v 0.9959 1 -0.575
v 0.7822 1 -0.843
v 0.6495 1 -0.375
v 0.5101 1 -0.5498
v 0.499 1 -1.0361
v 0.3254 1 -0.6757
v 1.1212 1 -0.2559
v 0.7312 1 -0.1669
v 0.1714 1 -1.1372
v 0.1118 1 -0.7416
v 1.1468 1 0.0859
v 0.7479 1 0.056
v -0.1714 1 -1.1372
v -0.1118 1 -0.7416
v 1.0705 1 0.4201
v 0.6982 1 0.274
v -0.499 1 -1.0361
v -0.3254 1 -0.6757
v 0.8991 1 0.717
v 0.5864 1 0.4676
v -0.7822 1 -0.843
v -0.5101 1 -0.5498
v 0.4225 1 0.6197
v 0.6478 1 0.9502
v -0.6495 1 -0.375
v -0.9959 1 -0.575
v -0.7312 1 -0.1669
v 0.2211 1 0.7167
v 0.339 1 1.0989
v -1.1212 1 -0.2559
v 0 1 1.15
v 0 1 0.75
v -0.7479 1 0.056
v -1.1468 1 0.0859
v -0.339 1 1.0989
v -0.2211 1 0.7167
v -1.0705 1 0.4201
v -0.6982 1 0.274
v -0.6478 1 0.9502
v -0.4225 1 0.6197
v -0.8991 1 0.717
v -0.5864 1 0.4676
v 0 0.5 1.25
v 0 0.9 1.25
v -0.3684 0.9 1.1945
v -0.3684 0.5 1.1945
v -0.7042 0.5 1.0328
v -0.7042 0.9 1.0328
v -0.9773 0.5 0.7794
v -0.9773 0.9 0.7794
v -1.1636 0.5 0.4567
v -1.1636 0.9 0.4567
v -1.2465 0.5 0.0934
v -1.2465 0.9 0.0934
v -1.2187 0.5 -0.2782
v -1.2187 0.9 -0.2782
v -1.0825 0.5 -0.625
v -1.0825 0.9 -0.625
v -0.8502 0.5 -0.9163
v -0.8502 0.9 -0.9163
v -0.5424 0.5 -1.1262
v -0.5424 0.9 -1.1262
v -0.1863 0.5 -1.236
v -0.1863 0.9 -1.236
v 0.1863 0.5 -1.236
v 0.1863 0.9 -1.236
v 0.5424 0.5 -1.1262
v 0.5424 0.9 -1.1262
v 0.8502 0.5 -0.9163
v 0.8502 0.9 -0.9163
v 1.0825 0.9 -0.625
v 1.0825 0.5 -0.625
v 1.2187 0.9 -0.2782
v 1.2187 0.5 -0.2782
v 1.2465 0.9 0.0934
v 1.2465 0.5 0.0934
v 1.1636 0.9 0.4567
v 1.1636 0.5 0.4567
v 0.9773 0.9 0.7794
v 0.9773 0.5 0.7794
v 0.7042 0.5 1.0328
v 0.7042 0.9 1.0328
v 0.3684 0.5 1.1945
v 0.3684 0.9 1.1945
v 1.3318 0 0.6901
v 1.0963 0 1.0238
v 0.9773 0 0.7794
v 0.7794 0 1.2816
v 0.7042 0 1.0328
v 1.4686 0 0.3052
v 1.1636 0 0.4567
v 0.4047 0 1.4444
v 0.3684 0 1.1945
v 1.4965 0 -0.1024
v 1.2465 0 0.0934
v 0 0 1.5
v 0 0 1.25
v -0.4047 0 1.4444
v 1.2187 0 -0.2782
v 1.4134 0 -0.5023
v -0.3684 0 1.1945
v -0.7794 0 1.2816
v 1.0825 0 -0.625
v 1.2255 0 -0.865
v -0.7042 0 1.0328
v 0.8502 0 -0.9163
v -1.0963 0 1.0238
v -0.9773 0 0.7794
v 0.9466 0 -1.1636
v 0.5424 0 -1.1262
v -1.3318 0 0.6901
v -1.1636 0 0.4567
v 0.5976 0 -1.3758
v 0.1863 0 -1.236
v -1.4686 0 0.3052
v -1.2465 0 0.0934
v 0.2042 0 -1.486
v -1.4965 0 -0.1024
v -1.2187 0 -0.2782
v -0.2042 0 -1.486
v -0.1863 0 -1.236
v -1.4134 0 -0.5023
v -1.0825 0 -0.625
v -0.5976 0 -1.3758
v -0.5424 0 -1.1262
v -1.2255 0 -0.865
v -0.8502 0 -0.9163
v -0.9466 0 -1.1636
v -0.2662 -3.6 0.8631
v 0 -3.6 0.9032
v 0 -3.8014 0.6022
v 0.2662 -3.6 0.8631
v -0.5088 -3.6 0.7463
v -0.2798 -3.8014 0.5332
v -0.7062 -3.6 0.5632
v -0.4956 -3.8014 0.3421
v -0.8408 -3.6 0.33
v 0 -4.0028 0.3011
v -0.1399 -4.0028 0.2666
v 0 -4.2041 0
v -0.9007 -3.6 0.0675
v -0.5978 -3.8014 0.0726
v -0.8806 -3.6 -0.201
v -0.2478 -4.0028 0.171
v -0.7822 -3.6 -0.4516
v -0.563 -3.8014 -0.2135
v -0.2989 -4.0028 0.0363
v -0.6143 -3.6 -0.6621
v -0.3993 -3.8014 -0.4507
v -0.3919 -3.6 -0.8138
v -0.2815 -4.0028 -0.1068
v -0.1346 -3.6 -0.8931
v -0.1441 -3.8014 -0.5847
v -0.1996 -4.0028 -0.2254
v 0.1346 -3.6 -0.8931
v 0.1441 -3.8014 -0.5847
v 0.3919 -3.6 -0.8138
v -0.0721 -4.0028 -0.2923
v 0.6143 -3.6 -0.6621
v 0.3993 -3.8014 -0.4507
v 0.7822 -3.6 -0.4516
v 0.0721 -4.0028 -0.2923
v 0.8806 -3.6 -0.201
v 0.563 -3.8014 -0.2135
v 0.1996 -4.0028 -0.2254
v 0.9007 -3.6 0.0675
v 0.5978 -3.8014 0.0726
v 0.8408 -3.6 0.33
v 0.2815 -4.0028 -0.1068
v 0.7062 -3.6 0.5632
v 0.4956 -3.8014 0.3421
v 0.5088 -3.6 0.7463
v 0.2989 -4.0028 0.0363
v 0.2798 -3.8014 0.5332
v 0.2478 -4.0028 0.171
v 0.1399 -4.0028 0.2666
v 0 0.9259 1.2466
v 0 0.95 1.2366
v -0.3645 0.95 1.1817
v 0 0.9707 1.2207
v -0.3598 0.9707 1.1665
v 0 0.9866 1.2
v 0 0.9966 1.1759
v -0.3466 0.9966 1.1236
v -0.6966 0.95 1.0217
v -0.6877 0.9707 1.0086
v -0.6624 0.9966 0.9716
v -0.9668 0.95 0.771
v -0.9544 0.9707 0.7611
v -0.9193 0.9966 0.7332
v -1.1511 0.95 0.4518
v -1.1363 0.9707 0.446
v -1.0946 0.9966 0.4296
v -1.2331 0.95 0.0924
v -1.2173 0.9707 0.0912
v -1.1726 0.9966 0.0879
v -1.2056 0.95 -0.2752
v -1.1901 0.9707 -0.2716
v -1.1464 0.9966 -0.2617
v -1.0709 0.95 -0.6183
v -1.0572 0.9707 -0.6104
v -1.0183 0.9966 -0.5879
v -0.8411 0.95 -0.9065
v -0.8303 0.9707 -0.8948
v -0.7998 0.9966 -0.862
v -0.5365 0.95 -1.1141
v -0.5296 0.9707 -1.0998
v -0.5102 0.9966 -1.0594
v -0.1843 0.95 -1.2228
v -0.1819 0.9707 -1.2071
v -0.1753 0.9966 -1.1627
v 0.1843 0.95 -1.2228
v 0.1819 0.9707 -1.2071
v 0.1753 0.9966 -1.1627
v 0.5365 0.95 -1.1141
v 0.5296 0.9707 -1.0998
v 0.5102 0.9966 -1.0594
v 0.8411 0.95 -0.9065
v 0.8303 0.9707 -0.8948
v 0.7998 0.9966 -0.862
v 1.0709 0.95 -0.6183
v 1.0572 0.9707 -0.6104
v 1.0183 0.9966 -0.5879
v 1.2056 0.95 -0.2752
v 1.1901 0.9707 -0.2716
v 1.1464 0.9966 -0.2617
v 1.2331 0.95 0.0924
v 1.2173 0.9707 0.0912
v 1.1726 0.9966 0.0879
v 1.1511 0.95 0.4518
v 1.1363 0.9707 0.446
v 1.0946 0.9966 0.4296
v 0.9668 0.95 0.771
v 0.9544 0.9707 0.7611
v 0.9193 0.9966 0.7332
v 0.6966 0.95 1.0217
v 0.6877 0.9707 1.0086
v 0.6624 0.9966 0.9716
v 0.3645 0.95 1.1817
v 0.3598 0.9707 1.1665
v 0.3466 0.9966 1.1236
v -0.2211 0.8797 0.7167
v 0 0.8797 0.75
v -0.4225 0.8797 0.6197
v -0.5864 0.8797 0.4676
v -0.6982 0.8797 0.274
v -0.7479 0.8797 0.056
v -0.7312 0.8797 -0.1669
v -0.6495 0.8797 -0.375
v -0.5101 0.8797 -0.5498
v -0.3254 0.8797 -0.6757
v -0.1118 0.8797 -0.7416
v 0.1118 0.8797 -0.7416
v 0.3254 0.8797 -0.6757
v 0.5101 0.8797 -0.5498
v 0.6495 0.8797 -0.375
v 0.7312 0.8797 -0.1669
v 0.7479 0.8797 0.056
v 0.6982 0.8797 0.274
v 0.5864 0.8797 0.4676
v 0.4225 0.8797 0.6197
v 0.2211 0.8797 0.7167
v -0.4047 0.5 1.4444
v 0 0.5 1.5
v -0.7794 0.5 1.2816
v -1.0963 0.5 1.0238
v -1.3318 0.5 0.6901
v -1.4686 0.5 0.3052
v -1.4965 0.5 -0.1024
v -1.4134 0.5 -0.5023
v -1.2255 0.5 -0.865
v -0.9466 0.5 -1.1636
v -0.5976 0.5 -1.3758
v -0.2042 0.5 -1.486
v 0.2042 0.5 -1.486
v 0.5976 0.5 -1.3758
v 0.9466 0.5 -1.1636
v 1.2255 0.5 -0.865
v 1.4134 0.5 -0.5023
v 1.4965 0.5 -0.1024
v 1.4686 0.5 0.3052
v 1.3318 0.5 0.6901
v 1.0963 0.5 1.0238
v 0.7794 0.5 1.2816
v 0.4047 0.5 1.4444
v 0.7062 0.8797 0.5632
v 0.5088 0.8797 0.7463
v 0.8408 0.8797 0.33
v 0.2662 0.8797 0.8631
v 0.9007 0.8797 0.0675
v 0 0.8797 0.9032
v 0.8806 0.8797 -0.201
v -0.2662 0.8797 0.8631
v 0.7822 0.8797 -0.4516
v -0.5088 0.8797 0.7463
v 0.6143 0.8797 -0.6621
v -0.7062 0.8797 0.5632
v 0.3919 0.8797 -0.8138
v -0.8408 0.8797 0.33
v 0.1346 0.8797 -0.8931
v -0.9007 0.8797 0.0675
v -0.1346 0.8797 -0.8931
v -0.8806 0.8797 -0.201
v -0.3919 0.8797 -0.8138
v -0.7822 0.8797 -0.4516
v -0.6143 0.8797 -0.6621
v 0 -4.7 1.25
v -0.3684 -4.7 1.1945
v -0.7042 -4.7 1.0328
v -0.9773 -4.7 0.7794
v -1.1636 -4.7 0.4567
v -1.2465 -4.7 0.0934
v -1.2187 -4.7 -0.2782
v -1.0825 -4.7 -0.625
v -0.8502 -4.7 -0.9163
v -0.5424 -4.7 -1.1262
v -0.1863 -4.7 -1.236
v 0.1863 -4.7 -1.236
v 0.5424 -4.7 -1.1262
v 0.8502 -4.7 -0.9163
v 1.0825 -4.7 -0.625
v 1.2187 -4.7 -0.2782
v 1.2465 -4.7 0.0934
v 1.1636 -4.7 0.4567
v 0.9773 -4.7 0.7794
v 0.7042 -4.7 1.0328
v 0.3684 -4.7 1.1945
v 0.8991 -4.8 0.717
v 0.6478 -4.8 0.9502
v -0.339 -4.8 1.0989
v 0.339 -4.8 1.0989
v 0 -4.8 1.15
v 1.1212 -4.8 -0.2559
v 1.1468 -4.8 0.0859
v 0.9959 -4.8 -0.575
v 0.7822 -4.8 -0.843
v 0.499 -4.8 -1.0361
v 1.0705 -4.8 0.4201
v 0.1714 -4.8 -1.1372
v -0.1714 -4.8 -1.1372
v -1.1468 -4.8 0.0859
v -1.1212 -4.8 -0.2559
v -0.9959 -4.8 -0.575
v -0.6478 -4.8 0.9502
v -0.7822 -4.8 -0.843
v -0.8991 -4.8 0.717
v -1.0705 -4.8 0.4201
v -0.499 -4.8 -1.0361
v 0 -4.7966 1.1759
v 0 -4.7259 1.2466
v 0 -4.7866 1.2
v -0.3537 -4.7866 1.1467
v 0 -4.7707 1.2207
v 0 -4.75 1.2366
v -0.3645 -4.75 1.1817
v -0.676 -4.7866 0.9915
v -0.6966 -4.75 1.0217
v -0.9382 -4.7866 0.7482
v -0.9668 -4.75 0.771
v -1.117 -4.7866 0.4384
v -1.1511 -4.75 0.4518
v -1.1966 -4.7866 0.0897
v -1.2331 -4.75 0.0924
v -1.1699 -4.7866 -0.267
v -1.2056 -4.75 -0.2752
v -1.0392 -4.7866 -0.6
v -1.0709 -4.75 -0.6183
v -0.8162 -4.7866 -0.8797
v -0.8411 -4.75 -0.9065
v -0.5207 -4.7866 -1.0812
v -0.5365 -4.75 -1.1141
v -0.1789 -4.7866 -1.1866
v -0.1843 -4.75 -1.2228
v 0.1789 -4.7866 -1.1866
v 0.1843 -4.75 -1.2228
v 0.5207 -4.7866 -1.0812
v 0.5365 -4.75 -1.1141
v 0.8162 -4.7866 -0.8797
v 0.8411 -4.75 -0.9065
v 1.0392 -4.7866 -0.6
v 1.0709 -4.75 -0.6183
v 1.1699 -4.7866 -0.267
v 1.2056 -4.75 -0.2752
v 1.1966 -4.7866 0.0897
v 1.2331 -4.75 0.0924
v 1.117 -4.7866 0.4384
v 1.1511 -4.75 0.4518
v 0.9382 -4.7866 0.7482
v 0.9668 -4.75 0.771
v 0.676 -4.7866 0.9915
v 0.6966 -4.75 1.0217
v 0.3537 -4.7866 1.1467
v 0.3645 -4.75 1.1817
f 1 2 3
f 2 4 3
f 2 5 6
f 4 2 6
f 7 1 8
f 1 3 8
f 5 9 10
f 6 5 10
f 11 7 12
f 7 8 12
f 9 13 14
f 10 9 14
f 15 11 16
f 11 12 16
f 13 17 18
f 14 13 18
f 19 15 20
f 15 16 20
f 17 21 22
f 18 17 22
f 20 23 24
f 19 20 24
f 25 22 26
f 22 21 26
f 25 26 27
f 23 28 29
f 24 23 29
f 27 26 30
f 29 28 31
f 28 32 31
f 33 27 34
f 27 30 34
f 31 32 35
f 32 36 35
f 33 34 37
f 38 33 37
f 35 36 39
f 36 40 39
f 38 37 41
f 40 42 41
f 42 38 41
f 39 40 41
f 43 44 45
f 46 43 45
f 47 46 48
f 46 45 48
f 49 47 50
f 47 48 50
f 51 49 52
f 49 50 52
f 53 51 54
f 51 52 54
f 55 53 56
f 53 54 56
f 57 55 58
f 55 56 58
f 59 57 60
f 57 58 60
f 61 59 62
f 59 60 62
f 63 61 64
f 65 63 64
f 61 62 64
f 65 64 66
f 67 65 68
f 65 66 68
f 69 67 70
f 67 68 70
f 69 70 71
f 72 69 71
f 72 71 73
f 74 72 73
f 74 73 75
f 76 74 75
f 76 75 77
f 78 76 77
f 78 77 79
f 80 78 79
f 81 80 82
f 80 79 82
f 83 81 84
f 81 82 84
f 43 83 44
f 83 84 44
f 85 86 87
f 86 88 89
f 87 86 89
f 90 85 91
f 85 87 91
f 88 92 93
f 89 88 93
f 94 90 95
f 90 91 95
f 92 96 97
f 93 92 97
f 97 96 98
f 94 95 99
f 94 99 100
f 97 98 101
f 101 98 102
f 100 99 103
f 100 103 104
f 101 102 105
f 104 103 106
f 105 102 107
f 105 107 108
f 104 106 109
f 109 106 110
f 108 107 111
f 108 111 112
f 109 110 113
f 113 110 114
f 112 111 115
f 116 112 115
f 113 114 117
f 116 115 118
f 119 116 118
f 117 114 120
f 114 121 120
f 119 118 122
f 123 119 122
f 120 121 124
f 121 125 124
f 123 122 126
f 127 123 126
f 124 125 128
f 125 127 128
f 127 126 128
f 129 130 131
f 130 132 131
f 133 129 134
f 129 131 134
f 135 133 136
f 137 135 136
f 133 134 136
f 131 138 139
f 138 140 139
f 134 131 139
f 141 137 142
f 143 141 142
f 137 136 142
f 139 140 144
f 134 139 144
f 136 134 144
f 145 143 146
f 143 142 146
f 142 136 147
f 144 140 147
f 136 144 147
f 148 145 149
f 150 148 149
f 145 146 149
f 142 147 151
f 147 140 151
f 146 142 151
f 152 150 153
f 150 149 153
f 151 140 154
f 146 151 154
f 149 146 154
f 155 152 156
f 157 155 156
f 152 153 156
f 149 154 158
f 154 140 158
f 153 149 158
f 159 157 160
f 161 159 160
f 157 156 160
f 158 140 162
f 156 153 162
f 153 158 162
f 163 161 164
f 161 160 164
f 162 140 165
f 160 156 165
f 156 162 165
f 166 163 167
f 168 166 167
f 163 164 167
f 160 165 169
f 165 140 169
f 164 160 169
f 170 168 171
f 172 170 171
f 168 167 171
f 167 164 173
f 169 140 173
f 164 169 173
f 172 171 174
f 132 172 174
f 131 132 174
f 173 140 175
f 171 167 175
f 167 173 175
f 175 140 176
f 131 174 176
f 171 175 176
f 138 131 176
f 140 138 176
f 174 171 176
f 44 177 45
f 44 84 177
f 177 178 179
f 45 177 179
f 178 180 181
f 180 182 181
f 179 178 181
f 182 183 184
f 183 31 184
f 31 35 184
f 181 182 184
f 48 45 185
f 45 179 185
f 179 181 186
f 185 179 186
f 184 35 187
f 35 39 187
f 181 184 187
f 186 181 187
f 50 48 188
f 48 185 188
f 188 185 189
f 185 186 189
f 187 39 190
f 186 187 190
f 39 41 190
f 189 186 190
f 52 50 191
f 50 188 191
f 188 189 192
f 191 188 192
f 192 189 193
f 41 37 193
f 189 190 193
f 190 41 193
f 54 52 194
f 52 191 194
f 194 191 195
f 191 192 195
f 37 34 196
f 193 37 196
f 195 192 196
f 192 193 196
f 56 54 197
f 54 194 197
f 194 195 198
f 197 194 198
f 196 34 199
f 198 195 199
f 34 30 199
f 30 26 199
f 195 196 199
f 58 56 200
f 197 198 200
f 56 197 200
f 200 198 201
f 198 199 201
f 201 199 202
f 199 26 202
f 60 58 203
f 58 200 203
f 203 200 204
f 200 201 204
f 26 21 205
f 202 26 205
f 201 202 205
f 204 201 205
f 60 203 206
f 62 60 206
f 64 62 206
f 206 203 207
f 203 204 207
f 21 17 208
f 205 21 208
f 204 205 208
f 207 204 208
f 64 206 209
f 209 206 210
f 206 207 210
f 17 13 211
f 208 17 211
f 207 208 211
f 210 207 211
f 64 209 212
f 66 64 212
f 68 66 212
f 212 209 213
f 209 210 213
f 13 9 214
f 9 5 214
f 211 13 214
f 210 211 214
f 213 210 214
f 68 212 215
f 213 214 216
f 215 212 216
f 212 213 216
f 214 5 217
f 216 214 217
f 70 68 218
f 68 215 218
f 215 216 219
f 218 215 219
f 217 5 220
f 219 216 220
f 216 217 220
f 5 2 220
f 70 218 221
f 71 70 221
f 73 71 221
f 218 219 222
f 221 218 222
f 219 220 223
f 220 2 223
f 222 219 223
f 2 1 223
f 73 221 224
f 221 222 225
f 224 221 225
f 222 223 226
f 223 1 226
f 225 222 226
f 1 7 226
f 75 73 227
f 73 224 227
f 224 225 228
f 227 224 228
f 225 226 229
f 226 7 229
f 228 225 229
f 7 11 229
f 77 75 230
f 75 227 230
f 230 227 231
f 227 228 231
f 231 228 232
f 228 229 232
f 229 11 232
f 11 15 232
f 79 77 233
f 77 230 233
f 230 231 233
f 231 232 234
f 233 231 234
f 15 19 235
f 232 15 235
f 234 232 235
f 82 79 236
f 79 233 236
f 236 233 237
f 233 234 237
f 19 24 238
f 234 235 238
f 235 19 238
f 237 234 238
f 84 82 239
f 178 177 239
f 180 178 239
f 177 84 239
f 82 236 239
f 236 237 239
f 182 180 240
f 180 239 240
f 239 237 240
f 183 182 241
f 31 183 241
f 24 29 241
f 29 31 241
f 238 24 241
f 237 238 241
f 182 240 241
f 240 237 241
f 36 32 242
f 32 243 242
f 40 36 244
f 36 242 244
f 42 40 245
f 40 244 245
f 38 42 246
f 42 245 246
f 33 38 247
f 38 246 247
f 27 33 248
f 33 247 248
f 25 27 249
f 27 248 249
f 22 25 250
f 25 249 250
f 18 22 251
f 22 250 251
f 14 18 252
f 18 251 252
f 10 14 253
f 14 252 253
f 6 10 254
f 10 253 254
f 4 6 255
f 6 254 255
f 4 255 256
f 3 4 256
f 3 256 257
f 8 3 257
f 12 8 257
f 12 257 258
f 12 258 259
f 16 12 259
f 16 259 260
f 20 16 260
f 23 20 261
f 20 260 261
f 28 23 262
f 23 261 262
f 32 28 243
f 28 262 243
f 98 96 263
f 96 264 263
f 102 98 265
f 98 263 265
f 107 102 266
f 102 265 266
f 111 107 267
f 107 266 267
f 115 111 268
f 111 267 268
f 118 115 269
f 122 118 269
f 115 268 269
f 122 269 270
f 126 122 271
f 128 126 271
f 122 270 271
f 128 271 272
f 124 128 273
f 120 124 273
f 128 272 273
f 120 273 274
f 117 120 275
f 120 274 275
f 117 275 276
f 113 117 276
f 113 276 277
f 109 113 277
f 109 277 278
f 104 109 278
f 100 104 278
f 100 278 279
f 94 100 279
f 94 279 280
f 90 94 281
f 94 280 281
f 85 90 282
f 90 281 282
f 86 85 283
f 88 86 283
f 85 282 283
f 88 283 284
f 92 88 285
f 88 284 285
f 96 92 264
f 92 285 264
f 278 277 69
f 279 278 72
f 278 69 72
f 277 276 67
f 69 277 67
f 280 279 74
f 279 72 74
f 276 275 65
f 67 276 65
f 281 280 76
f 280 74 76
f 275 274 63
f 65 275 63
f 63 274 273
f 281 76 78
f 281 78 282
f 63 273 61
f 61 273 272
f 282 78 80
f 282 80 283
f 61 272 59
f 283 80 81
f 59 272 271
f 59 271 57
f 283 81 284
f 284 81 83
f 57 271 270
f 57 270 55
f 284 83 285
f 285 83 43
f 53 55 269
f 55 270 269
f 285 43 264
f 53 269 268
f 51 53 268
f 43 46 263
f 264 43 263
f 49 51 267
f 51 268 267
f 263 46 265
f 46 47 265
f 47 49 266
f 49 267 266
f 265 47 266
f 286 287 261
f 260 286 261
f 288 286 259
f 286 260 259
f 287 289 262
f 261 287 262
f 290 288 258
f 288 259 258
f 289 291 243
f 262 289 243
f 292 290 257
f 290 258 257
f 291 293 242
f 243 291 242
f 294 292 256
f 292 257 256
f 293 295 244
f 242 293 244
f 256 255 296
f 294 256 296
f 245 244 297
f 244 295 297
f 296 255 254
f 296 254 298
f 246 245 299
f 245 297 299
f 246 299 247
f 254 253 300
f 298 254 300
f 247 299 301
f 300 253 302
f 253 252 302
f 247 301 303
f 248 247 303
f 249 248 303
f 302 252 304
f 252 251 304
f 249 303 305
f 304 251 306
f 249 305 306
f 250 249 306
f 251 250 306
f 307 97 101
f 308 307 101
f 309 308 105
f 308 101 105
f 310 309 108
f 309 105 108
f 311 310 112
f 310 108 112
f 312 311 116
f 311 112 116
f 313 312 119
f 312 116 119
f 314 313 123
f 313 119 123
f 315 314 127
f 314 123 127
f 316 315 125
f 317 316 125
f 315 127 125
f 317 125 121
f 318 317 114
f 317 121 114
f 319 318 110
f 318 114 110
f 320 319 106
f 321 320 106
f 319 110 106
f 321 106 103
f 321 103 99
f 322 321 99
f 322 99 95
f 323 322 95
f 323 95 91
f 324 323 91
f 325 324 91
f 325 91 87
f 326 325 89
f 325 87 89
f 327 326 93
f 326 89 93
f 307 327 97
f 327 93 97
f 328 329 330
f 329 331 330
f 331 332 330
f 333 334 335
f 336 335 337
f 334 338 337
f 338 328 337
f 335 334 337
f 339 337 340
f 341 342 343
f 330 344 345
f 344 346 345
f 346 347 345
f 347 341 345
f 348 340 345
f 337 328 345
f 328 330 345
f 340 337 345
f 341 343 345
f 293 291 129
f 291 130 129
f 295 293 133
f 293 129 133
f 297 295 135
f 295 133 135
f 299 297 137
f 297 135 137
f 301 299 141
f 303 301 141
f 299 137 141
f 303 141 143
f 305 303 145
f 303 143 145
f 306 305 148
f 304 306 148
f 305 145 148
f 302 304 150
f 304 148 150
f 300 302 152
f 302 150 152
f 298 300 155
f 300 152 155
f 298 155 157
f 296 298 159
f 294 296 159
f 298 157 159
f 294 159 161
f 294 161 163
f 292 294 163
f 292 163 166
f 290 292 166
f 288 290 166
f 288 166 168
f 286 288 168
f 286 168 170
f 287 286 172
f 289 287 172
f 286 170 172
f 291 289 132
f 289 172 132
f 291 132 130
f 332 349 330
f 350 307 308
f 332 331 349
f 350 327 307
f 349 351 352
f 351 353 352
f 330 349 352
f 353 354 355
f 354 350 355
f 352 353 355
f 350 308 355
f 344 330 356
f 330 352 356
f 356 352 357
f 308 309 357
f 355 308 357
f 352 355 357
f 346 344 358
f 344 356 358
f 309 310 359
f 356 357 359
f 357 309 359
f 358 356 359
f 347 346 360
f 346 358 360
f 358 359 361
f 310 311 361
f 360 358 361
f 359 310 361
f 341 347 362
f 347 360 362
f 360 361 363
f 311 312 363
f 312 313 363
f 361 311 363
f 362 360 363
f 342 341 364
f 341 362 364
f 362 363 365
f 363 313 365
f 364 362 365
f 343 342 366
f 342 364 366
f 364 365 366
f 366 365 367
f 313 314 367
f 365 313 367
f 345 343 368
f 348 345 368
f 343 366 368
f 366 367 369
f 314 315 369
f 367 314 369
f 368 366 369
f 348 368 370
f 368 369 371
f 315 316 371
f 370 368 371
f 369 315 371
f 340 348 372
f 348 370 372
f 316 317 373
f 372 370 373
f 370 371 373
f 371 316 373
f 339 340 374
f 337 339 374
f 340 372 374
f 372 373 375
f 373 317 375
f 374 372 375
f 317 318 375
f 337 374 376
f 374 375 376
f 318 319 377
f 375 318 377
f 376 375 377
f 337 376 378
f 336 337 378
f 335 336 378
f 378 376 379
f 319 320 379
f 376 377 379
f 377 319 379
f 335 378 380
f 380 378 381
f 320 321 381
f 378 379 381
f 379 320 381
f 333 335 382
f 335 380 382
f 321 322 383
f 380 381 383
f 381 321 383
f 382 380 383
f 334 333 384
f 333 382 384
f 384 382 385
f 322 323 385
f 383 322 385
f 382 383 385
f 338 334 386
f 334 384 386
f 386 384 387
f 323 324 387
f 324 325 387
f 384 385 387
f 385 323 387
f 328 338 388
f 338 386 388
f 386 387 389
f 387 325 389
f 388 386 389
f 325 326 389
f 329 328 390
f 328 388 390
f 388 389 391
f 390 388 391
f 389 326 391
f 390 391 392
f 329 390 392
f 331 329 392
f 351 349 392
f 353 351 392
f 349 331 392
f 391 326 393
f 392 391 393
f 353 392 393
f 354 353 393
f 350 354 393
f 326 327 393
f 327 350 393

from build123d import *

# Parameters (mm, degrees)
FILLET_1_R = 0.1


with BuildPart() as part:
    # 草图1 → 旋转1 (revolve)
    with BuildSketch(Plane.XY, mode=Mode.PRIVATE) as revolve_1_sk:
        Polygon((0, -4.8), (-1.25, -4.8), (-1.25, 0), (-1.5, 0), (-1.5, 0.5), (-1.25, 0.5), (-1.25, 1), (-0.75, 1), (-0.75, 0.879741215), (-0.903225338, 0.879741215), (-0.903225338, -3.6), (0, -4.204142763), align=None)
    revolve(revolve_1_sk.sketch.rotate(Axis((0, 8.238789055, 0), (0, -1, 0)), 270), axis=Axis((0, 8.238789055, 0), (0, -1, 0)))

    # 圆角1
    fillet_1_edges = [part.edges().sort_by_distance(p)[0] for p in [
        (0, 1, -1.25),
        (0, -4.8, -1.25),
    ]]
    fillet(fillet_1_edges, radius=FILLET_1_R)


solid = part.part
